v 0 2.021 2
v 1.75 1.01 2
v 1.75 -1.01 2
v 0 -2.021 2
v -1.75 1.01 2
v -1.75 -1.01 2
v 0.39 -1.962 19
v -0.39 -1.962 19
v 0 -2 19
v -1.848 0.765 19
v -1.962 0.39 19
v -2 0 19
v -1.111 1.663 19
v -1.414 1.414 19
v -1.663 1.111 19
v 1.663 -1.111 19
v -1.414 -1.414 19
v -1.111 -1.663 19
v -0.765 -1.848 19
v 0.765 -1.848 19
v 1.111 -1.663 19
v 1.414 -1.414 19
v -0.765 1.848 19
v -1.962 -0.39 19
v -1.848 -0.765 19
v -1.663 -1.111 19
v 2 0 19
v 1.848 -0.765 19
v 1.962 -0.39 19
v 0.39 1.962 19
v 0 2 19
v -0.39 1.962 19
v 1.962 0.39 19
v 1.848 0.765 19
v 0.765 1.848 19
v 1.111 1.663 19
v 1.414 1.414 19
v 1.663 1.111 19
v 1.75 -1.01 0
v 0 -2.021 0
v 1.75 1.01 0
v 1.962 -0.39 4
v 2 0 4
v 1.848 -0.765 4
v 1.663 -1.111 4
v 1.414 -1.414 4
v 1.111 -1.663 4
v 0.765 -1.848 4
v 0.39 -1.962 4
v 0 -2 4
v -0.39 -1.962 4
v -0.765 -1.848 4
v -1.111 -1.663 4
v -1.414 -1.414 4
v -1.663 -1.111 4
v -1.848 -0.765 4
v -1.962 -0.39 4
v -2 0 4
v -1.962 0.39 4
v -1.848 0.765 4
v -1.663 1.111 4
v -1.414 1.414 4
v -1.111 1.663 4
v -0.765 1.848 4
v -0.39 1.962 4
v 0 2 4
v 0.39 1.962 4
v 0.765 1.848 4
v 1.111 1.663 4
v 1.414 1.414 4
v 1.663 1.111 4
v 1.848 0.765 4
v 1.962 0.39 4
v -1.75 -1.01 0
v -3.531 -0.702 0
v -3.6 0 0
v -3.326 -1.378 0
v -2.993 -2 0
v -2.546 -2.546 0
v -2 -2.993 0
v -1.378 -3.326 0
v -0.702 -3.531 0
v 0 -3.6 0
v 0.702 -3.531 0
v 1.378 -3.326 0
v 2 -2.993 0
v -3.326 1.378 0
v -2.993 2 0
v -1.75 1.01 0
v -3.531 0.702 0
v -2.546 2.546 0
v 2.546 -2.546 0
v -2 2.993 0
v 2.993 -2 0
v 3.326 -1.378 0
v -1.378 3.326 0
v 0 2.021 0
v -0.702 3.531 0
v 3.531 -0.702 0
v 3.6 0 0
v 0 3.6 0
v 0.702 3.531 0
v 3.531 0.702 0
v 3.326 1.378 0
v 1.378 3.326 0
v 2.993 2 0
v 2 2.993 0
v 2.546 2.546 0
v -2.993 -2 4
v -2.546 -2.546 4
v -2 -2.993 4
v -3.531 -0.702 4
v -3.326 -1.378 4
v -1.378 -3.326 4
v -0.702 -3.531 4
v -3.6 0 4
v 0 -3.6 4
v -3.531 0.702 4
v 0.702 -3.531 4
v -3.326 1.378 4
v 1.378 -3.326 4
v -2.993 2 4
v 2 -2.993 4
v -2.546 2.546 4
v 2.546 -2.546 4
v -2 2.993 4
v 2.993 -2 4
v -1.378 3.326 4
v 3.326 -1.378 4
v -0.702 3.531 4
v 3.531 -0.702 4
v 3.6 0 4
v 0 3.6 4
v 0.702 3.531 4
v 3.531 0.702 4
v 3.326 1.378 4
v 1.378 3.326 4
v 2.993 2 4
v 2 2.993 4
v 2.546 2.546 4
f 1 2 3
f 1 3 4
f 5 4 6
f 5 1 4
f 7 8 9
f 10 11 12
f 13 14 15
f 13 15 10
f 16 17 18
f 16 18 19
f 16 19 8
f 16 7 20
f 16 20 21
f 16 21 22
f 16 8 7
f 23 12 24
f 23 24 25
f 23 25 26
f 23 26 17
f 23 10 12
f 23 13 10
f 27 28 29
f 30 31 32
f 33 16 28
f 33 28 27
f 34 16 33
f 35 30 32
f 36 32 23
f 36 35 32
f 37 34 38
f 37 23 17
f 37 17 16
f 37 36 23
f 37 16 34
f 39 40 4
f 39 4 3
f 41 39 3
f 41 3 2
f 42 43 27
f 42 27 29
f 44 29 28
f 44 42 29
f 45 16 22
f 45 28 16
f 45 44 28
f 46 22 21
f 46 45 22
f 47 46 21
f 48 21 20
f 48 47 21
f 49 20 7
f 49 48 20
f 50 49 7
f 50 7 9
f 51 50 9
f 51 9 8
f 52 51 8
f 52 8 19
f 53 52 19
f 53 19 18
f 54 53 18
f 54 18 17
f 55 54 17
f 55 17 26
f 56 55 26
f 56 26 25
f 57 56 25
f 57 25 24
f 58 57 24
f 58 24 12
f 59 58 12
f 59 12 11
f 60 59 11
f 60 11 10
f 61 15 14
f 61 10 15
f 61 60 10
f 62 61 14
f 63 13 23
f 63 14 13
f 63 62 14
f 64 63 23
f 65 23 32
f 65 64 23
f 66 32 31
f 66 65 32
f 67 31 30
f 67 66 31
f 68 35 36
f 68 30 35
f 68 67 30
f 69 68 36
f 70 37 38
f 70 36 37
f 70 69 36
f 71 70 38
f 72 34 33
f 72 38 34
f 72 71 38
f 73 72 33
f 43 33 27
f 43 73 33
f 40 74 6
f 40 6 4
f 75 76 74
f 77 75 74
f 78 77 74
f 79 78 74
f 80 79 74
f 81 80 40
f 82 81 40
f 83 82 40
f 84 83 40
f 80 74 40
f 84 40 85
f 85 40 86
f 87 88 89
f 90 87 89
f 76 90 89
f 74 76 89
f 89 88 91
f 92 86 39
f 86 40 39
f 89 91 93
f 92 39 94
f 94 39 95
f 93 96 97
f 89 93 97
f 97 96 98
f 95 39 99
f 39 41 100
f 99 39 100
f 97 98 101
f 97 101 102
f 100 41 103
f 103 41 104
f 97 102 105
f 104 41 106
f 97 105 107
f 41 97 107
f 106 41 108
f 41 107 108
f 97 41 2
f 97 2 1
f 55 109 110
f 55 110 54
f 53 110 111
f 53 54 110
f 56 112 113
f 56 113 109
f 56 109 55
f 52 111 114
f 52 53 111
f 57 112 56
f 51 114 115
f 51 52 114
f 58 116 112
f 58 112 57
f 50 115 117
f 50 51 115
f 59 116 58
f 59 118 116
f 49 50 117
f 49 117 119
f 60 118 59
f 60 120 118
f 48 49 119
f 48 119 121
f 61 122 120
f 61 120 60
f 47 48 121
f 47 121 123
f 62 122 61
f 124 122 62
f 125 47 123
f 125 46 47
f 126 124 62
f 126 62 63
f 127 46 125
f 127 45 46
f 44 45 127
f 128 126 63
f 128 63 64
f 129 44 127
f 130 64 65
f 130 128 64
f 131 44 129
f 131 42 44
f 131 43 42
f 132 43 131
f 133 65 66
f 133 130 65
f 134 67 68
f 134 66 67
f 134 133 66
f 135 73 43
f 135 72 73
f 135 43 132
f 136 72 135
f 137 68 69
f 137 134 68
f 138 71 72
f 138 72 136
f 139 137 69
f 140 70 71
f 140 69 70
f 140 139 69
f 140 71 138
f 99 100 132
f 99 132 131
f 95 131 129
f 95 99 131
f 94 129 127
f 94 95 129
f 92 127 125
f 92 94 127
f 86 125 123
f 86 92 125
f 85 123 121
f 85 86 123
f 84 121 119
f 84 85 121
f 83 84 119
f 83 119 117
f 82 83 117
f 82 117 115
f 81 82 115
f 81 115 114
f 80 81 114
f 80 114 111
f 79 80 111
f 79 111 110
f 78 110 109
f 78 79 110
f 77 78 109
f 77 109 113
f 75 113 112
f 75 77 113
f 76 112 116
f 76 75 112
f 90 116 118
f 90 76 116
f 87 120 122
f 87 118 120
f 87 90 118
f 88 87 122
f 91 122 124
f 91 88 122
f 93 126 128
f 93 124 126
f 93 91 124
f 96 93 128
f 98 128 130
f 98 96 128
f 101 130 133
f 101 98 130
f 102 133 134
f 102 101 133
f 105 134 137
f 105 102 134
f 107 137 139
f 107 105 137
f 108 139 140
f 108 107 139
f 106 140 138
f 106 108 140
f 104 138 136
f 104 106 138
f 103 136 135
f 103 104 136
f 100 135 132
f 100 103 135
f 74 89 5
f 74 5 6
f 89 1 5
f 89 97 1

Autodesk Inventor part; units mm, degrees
ref_plane "YZ Plane" through (0, 0, 0) normal (1, 0, 0) x (0, 1, 0)
ref_plane "XZ Plane" through (0, 0, 0) normal (0, 1, 0) x (-1, 0, 0)
ref_plane "XY Plane" through (0, 0, 0) normal (0, 0, 1) x (1, 0, 0)
sketch "スケッチ1" plane through (0, 0, 0) normal (0, 0, 1) x (1, 0, 0)
  circle A0 centre (0, 0) radius 3.6
  dimension "d0" = 7.2
extrude "押し出し1" add sketch "スケッチ1" along normal blind 4
sketch "スケッチ2" plane through (0, 0, 4) normal (0, 0, 1) x (1, 0, 0)
  circle A0 centre (0, 0) radius 2
  dimension "d3" = 4
extrude "押し出し2" add sketch "スケッチ2" along normal blind 15
thread "ねじ1" size "M4x0.7" class "6g" standard "ISO Metric profile" full length
sketch "スケッチ3" plane through (0, 0, 0) normal (0, 0, -1) x (-1, 0, 0)
  line L0 (0, -2.0207) -> (-1.75, -1.0104)
  line L1 (-1.75, -1.0104) -> (-1.75, 1.0104)
  line L2 (-1.75, 1.0104) -> (0, 2.0207)
  line L3 (0, 2.0207) -> (1.75, 1.0104)
  line L4 (1.75, 1.0104) -> (1.75, -1.0104)
  line L5 (1.75, -1.0104) -> (0, -2.0207)
  point P0 (0, 0)
  point P1 (0, 0)
  dimension "d8" = 3.5
extrude "押し出し3" cut sketch "スケッチ3" against normal blind 2
properties part number "Bolt_M3_15_for_SetCollar_d6" material "ステンレス鋼"
